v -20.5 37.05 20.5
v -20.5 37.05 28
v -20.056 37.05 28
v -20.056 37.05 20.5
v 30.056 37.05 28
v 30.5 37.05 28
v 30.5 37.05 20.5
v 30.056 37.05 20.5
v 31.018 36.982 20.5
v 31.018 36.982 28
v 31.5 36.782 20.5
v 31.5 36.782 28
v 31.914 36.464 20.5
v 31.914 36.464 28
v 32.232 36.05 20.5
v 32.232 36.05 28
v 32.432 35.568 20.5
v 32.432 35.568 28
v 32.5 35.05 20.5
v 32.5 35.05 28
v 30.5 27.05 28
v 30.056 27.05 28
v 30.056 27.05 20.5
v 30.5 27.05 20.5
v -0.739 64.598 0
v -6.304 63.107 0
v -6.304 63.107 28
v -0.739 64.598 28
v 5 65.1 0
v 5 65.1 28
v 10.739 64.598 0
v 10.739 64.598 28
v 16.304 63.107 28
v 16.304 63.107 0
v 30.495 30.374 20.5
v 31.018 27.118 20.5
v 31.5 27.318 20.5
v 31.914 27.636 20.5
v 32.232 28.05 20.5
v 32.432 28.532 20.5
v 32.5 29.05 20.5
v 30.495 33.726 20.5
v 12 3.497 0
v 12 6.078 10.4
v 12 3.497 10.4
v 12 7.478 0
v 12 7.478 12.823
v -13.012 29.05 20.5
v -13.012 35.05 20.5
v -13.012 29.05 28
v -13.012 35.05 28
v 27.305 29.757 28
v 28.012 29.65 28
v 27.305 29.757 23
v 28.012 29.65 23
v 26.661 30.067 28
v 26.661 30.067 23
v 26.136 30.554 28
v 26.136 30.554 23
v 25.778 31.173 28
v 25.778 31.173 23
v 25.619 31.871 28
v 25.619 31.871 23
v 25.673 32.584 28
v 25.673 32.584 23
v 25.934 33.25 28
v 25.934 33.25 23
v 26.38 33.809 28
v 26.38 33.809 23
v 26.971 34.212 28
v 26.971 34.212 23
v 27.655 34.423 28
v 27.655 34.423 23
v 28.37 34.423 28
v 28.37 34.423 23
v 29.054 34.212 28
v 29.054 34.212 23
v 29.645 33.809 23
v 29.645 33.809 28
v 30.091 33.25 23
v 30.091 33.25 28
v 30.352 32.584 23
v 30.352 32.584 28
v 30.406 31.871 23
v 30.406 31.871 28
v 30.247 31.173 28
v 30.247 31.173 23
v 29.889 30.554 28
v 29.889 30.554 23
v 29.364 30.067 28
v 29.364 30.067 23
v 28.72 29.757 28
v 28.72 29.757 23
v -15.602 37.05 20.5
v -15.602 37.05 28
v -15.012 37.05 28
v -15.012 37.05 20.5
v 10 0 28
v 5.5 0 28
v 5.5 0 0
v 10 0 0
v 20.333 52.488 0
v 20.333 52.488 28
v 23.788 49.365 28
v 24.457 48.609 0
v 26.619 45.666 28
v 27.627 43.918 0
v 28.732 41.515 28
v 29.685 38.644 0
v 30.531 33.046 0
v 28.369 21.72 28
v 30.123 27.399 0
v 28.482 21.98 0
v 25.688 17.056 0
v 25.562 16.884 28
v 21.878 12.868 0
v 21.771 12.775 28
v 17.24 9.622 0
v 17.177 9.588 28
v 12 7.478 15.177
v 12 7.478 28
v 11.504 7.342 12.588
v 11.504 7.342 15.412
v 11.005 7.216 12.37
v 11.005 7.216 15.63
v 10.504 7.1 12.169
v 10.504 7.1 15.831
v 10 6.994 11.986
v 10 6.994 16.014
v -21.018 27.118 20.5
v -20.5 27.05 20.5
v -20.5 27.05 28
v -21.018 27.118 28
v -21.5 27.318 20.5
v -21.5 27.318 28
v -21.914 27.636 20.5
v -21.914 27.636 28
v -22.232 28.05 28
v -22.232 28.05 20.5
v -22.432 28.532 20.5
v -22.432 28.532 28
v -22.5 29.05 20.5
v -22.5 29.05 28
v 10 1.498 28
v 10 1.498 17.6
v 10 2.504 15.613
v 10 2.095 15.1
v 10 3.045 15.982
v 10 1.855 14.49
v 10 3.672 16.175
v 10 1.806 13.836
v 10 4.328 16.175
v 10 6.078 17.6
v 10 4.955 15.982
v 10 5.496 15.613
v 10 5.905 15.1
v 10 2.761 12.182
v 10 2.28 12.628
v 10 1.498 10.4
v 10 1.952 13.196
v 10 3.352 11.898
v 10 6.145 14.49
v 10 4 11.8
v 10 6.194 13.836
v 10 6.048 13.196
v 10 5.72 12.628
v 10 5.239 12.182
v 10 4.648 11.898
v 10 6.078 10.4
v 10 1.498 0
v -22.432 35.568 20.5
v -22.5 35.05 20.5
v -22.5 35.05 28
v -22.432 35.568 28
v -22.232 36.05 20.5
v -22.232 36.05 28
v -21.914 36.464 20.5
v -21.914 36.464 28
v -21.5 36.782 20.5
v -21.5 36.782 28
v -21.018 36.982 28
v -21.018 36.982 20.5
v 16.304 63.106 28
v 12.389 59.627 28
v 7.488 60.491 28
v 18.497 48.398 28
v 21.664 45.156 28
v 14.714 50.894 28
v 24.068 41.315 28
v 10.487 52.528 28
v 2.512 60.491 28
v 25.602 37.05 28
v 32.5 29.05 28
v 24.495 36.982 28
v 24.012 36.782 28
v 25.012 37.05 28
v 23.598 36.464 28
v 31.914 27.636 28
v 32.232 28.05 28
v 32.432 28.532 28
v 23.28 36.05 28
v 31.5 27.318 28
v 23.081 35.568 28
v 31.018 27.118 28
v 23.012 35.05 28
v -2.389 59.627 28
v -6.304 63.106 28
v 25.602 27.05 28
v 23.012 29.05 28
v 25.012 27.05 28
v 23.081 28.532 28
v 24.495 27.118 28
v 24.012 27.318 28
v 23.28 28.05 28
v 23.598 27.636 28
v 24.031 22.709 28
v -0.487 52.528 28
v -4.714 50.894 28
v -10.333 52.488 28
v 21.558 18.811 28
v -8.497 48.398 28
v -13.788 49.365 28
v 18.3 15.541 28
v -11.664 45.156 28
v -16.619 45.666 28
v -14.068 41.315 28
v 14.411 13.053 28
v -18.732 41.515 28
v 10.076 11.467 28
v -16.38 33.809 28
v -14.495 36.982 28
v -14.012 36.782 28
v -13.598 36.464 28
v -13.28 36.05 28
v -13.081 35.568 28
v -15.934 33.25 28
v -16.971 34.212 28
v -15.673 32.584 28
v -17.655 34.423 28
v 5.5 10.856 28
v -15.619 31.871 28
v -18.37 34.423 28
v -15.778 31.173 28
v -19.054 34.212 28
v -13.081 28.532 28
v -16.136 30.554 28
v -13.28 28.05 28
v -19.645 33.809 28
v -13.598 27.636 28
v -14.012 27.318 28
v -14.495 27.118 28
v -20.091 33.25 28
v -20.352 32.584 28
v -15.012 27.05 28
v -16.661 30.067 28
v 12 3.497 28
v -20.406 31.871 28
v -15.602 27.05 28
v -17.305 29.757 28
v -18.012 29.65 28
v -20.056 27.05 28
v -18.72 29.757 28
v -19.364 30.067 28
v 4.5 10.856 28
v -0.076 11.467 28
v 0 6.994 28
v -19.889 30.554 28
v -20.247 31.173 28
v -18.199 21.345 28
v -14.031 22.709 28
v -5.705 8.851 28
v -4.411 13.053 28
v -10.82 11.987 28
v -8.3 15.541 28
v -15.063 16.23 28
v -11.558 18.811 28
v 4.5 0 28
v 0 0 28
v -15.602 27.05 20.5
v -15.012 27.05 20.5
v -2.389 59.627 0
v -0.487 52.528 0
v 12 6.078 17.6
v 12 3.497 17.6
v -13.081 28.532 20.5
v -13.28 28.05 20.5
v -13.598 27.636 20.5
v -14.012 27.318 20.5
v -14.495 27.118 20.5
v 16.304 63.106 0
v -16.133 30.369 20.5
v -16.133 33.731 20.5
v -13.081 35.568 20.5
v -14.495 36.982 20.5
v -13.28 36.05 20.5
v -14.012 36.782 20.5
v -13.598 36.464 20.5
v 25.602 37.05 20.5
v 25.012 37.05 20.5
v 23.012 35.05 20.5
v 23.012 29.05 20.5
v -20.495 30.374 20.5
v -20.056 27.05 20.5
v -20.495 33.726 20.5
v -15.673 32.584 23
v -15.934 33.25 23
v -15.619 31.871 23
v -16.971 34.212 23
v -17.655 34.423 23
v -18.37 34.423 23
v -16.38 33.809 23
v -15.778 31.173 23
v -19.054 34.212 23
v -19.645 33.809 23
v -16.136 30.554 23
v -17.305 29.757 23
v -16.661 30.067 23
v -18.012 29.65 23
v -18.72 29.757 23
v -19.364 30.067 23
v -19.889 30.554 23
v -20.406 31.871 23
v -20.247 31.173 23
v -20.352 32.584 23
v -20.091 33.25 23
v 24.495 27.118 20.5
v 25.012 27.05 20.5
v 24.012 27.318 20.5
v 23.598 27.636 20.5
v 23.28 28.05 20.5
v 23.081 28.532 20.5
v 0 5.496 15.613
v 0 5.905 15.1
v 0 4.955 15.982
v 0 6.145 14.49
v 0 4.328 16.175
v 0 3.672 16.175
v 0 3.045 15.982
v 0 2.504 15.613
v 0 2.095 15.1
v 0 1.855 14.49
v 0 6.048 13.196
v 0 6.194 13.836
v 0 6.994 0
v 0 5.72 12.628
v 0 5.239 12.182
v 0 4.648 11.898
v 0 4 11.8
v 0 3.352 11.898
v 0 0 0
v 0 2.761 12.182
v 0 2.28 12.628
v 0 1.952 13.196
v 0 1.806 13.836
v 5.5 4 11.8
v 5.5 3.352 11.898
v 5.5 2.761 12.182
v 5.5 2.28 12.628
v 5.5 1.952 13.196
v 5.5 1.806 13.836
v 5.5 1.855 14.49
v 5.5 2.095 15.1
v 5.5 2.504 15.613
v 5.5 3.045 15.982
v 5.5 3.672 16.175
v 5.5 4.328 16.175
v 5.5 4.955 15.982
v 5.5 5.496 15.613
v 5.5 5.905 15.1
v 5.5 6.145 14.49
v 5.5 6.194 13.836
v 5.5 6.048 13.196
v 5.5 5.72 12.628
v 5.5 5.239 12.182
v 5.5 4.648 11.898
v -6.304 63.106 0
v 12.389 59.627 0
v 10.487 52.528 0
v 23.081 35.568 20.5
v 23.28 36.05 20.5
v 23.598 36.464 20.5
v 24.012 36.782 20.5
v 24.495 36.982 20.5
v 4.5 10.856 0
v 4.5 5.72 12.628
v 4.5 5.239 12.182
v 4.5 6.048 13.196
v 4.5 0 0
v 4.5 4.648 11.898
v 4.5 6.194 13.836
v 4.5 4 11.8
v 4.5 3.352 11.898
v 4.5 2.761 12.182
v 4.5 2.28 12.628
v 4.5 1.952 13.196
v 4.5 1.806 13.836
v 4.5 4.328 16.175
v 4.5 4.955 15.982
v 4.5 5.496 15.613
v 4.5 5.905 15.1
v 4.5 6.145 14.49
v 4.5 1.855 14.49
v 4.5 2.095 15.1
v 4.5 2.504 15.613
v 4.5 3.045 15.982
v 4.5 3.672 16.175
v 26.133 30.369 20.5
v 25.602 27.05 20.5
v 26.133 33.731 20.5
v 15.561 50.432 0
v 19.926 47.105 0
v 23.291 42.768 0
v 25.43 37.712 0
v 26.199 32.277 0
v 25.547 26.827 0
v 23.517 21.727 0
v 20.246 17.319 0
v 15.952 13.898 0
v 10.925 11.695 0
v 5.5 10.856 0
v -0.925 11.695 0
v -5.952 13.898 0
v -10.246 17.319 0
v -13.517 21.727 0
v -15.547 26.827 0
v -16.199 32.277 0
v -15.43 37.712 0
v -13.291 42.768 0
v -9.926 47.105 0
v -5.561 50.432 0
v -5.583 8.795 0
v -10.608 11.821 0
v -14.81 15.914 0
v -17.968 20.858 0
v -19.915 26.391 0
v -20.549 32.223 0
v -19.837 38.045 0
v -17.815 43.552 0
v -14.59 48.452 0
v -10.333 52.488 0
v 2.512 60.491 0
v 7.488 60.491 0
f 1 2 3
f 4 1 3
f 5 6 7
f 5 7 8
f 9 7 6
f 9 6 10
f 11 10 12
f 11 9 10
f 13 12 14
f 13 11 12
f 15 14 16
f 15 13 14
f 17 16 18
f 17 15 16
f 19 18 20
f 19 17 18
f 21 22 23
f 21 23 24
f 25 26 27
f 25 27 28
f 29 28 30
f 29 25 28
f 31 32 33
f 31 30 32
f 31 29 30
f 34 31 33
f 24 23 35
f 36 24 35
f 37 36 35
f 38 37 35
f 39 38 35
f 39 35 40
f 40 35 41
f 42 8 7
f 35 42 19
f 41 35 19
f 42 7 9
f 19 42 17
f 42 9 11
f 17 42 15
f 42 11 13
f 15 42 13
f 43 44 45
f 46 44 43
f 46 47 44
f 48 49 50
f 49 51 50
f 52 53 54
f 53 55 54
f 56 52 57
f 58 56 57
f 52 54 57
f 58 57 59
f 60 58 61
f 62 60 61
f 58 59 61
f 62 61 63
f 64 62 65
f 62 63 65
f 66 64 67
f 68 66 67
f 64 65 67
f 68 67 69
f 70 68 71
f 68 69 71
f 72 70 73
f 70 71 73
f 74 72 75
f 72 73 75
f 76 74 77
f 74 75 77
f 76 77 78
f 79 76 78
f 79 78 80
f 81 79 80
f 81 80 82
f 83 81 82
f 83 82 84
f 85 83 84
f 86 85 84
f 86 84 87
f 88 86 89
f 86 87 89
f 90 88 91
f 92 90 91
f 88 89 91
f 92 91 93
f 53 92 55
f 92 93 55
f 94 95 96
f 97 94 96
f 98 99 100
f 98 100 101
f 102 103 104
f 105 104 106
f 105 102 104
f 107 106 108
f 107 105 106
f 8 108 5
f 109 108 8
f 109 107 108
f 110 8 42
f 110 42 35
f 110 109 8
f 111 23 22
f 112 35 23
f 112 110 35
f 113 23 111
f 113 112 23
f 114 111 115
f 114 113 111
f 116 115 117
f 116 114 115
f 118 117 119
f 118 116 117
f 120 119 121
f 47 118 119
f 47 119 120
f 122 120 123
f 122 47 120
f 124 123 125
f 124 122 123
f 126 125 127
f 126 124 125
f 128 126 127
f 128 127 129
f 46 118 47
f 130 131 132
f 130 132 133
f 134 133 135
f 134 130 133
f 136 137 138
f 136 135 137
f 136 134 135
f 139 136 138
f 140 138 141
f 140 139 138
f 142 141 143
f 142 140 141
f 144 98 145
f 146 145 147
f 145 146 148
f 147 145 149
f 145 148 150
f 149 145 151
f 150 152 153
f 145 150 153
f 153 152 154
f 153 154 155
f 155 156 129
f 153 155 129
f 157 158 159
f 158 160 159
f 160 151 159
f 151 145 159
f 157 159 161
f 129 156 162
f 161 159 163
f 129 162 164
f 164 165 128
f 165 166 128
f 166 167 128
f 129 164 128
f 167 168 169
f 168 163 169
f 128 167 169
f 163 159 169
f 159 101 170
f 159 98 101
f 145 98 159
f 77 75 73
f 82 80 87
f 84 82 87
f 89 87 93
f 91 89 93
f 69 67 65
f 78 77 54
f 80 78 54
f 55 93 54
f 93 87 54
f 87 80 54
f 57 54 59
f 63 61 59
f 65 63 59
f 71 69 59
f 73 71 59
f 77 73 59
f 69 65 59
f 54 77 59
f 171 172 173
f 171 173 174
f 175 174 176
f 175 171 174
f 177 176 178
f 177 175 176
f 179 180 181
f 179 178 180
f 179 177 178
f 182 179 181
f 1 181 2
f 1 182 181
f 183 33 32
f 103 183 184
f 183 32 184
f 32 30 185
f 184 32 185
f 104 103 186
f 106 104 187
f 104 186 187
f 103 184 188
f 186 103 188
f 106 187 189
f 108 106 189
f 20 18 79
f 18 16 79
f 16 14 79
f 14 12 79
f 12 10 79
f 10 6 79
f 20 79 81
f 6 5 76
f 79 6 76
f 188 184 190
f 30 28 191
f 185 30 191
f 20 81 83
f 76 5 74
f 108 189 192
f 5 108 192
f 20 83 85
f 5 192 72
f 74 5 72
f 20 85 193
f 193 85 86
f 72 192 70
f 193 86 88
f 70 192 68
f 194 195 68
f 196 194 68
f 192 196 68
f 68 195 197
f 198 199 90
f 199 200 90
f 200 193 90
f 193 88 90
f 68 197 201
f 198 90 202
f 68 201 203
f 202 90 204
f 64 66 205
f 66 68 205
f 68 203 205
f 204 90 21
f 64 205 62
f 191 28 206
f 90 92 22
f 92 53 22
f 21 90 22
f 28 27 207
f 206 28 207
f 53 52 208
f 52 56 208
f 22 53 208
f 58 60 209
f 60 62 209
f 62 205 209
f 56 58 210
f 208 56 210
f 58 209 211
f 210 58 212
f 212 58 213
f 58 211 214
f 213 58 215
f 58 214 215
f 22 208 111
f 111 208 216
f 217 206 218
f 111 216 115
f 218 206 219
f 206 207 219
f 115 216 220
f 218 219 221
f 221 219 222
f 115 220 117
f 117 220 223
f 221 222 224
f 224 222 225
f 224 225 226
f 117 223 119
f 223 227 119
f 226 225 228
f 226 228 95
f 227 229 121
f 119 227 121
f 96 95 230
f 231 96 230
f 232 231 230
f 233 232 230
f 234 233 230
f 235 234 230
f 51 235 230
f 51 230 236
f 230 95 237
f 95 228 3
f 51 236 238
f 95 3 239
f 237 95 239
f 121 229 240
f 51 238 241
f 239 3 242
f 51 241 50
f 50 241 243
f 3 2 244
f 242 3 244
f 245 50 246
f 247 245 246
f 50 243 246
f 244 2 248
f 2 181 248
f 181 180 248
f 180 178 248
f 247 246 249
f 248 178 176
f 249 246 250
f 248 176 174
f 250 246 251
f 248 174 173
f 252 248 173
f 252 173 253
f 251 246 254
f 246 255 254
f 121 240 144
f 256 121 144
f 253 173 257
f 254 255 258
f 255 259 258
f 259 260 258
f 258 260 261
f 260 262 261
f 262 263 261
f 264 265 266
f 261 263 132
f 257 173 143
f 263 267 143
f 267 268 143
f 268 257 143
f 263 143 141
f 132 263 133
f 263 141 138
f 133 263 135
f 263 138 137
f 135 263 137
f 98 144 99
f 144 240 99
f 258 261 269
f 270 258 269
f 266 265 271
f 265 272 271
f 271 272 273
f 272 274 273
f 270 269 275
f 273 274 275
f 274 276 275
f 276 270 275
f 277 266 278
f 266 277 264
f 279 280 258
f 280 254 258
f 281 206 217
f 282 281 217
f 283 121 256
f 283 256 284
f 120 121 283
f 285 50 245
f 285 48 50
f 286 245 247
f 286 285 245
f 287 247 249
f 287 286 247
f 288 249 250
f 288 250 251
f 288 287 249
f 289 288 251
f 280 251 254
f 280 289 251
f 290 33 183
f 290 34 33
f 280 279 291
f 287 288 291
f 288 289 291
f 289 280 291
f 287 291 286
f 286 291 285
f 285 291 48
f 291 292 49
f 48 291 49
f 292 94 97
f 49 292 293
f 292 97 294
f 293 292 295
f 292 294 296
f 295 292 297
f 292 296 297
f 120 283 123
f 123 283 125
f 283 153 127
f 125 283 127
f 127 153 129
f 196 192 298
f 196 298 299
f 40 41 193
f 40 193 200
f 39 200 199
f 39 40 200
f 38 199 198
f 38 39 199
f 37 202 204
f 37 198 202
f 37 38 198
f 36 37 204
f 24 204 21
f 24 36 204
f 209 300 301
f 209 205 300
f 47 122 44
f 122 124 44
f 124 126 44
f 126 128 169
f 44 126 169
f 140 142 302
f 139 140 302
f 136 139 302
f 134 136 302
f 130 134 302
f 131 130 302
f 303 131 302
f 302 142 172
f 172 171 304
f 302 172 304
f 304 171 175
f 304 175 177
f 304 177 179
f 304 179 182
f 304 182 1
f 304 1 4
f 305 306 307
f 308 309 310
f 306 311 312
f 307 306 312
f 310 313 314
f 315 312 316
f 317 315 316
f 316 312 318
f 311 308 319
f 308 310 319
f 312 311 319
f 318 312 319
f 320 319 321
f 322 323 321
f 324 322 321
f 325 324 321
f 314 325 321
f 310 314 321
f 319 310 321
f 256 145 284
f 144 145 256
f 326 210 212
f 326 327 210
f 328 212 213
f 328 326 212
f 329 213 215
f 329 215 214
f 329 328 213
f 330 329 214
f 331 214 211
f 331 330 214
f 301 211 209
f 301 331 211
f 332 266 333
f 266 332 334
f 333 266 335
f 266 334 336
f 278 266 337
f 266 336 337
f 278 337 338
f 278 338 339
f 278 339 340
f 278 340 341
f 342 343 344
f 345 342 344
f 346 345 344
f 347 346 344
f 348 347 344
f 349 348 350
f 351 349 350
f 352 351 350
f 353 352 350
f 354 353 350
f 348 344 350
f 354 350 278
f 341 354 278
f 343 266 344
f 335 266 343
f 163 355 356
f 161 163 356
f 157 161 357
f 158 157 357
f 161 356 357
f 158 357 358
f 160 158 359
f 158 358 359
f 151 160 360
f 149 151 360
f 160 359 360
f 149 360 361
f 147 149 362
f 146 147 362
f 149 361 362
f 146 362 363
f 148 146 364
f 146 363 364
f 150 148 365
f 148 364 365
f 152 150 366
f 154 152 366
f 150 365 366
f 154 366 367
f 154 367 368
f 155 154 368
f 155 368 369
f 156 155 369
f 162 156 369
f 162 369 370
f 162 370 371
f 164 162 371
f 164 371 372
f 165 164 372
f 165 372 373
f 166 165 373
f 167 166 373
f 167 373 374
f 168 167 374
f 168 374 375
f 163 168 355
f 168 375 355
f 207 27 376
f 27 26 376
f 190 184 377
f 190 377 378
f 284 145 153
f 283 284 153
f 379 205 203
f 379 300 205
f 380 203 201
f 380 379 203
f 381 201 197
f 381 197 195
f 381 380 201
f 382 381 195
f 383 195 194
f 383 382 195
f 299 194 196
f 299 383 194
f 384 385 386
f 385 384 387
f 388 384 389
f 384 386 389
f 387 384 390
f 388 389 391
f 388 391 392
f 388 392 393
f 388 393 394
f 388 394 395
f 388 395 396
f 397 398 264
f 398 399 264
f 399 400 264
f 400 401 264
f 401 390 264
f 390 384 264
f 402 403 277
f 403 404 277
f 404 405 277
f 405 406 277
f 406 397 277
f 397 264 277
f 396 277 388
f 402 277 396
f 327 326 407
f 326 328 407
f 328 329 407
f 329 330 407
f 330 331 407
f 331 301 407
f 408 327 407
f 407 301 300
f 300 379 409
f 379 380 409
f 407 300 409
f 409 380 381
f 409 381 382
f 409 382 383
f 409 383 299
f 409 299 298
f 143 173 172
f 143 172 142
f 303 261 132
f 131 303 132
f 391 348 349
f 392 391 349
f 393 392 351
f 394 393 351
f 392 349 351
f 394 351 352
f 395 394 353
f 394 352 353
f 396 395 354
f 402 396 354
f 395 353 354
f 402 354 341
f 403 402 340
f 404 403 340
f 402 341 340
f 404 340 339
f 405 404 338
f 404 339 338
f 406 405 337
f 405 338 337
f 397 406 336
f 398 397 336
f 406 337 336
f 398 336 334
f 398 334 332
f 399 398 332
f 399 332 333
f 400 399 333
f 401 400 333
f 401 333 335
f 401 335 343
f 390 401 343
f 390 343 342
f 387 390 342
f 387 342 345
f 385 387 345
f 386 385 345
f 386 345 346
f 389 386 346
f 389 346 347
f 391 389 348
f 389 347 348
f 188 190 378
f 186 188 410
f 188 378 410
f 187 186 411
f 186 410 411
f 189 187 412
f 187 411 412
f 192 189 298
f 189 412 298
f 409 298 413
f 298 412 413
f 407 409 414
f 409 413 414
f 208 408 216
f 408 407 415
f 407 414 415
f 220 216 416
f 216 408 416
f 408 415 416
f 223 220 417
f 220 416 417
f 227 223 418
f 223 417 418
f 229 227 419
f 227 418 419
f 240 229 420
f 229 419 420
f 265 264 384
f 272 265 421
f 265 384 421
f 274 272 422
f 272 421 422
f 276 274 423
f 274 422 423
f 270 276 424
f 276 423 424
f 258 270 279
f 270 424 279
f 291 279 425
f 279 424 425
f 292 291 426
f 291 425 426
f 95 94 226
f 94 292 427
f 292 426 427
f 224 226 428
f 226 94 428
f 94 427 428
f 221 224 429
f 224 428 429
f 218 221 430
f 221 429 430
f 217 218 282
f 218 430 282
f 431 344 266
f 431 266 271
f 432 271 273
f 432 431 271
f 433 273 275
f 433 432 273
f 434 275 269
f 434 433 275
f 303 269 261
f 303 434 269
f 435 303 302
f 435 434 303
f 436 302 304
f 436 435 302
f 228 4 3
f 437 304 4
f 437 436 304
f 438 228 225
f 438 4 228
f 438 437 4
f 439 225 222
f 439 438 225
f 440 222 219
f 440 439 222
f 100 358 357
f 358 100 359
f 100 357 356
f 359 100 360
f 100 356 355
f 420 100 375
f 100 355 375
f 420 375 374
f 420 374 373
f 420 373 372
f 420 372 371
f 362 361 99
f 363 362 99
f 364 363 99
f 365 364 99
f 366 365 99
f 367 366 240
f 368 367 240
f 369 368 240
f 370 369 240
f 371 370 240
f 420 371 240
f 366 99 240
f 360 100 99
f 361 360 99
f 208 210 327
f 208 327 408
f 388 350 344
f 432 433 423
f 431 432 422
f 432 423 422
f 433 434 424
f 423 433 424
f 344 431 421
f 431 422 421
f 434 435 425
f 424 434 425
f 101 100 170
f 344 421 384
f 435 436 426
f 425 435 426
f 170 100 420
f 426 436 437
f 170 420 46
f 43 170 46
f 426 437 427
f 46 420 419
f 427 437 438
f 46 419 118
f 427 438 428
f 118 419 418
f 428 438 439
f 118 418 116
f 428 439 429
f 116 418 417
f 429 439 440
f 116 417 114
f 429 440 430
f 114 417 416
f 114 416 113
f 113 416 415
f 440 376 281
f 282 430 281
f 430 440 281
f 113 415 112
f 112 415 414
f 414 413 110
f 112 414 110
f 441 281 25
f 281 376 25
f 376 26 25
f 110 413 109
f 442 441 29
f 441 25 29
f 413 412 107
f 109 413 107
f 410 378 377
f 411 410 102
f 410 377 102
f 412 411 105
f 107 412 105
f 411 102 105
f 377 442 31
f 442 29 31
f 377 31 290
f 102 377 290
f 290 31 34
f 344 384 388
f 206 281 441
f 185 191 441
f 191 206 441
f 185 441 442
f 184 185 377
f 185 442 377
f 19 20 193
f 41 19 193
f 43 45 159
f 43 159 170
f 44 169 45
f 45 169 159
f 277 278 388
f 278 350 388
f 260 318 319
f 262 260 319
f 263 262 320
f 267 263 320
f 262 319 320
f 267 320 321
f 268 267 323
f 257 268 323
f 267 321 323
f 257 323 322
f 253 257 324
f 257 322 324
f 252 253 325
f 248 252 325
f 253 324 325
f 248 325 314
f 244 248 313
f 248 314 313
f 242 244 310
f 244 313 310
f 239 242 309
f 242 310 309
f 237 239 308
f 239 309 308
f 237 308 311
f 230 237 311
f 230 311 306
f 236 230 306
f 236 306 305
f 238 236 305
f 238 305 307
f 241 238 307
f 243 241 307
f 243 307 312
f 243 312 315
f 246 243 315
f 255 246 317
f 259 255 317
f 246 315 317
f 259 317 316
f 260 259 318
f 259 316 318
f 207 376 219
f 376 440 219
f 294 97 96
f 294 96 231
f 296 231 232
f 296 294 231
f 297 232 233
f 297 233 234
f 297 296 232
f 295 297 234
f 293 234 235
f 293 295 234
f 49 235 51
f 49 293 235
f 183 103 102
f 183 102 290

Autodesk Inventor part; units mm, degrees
ref_plane "YZ Plane" through (0, 0, 0) normal (1, 0, 0) x (0, 1, 0)
ref_plane "XZ Plane" through (0, 0, 0) normal (0, 1, 0) x (-1, 0, 0)
ref_plane "XY Plane" through (0, 0, 0) normal (0, 0, 1) x (1, 0, 0)
sketch "スケッチ1" plane through (0, 0, 0) normal (0, 0, 1) x (1, 0, 0)
  line L0 (0, 0) -> (10, 0)
  line L1 (10, 0) -> (10, 32.05)
  line L2 (10, 32.05) -> (0, 32.05)
  line L3 (0, 32.05) -> (0, 0)
  circle A0 centre (5, 32.05) radius 25.55
  arc A1 (16.3038, 63.1068) -> (-6.3038, 63.1068) centre (5, 32.05) ccw
  line L4 (5, 32.05) -> (16.3038, 63.1068) construction
  line L5 (5, 32.05) -> (-6.3038, 63.1068) construction
  line L6 (-6.3038, 63.1068) -> (-3.7386, 56.0591)
  line L7 (16.3038, 63.1068) -> (13.7386, 56.0591)
  arc A2 (12.3893, 59.6272) -> (-2.3893, 59.6272) centre (5, 32.05) ccw
  arc A3 (10.4481, 52.3827) -> (-0.4481, 52.3827) centre (5, 32.05) ccw
  line L8 (-2.3893, 59.6272) -> (-0.4481, 52.3827)
  line L9 (12.3893, 59.6272) -> (10.4481, 52.3827)
  point P0 (0, 6.994)
  point P1 (10, 6.994)
  point P2 (5, 65.1)
  point P3 (5, 60.6)
  dimension "d0" = 32.05
  dimension "d1" = 51.1
  dimension "d27" = 10
  dimension "d28" = 5
  dimension "d43" = 21.05
  dimension "d44" = 7.5
  dimension "d45" = 4.5
  dimension "d46" = 30
  dimension "d47" = 5
extrude "押し出し1" add sketch "スケッチ1" along normal blind 28 contours L3 A0 L1 L0 | A0 L8 A3 L9 L1 L2 L3 | L3 L2 L1 A0 | L6 A1 L7 A0 L9 A2 L8
sketch "スケッチ2" plane through (0, 0, 28) normal (0, 0, 1) x (1, 0, 0)
  arc A0 (10, 6.994) -> (0, 6.994) centre (5, 32.05) ccw projected
  point P0 (0, 0)
hole "穴1" at (5, 32.05, 28) direction (0, 0, -1) diameter 42.4 end through all
sketch "スケッチ3" plane through (0, 0, 28) normal (0, 0, 1) x (1, 0, 0)
  line L0 (0, 0) -> (10, 0) projected
  line L1 (4.5, 0) -> (5.5, 0)
  line L2 (5.5, 0) -> (5.5, 32.05)
  line L3 (5.5, 32.05) -> (4.5, 32.05)
  line L4 (4.5, 32.05) -> (4.5, 0)
  line L5 (0, 6.994) -> (0, 0) projected
  arc A0 (-0.487, 52.5276) -> (10.487, 52.5276) centre (5, 32.05) ccw projected
  point P0 (5, 0)
  point P1 (5, 0)
  dimension "d14" = 1
extrude "押し出し2" cut sketch "スケッチ3" against normal up to surface (28 mm away)
sketch "スケッチ4" plane through (10, 0, 0) normal (1, 0, 0) x (0, 0, -1)
  circle A0 centre (-14, 4) radius 1.5
  line L0 (0, 0) -> (-28, 0) projected
  line L1 (0, 0) -> (0, 6.994) projected
  line L2 (-14, 0) -> (-14, 10)
  point P0 (0, 10)
  dimension "d17" = 4
  dimension "d19" = 3
hole "穴2" at (10, 4, 14) direction (-1, 0, 0) diameter 4.4 end through all
sketch "スケッチ7" plane through (10, 0, 0) normal (1, 0, 0) x (0, 0, -1)
  circle A0 centre (-14, 4) radius 2.2 projected
  line L0 (-14, 8.1569) -> (-10.4, 6.0785)
  line L1 (-10.4, 6.0785) -> (-10.4, 1.9215)
  line L2 (-10.4, 1.9215) -> (-14, -0.1569)
  line L3 (-14, -0.1569) -> (-17.6, 1.9215)
  line L4 (-17.6, 1.9215) -> (-17.6, 6.0785)
  line L5 (-17.6, 6.0785) -> (-14, 8.1569)
  line L6 (-28, 10.8559) -> (-28, 0) projected
  line L7 (0, 0) -> (0, 6.994) projected
  line L8 (-28, 10.8559) -> (0, 10.8559)
  line L9 (0, 10.8559) -> (0, 3.497)
  line L10 (0, 3.497) -> (-28, 3.497)
  line L11 (-28, 3.497) -> (-28, 10.8559)
  point P0 (-10.4, 3.497)
  point P1 (-28, 3.497)
  point P2 (-17.6, 3.497)
  dimension "d35" = 7.2
extrude "押し出し5" add sketch "スケッチ7" along normal blind 2 contours L10 L6 L8 L9 L7 L1 L0 L5 L4
chamfer "面取り1" distance 2 angle 45 2 edges at (10, 3.497, 22.8) (10, 3.497, 5.2)
chamfer "面取り2" distance 7.5 angle 45 2 edges at (-3.7386, 56.0591, 14) (13.7386, 56.0591, 14)
sketch "スケッチ8" plane through (0, 0, 28) normal (0, 0, 1) x (1, 0, 0)
  arc A0 (12, 7.4776) -> (20.3335, 52.4874) centre (5, 32.05) ccw projected
  line L0 (30.056, 37.05) -> (32.5, 37.05)
  line L1 (32.5, 37.05) -> (32.5, 27.05)
  line L2 (32.5, 27.05) -> (30.056, 27.05)
  line L3 (30.056, 27.05) -> (30.056, 37.05)
  arc A1 (-10.3335, 52.4874) -> (0, 6.994) centre (5, 32.05) ccw projected
  line L4 (-20.056, 37.05) -> (-22.5, 37.05)
  line L5 (-22.5, 37.05) -> (-22.5, 27.05)
  line L6 (-22.5, 27.05) -> (-20.056, 27.05)
  line L7 (-20.056, 27.05) -> (-20.056, 37.05)
  arc A2 (-10.3335, 52.4874) -> (0, 6.994) centre (5, 32.05) ccw projected
  line L8 (30.056, 37.05) -> (23.0125, 37.05)
  line L9 (23.0125, 37.05) -> (23.0125, 27.05)
  line L10 (23.0125, 27.05) -> (30.056, 27.05)
  line L11 (30.056, 27.05) -> (30.056, 37.05)
  line L12 (-20.056, 37.05) -> (-13.0125, 37.05)
  line L13 (-13.0125, 37.05) -> (-13.0125, 27.05)
  line L14 (-13.0125, 27.05) -> (-20.056, 27.05)
  line L15 (-20.056, 27.05) -> (-20.056, 37.05)
  arc A3 (12, 7.4776) -> (20.3335, 52.4874) centre (5, 32.05) ccw projected
  point P0 (0, 0)
  dimension "d51" = 55
  dimension "d52" = 10
  dimension "d57" = 36.025
extrude "押し出し6" add sketch "スケッチ8" against normal blind 7.5
sketch "スケッチ9" plane through (0, 0, 28) normal (0, 0, 1) x (1, 0, 0)
  line L0 (32.5, 27.05) -> (32.5, 37.05) projected
  arc A0 (5.5, 10.8559) -> (10.487, 52.5276) centre (5, 32.05) ccw projected
  point P0 (0, 0)
  point P1 (-18.0125, 32.05)
  point P2 (28.0125, 32.05)
  point P3 (32.5, 32.05)
  dimension "d55" = 46.025
  dimension "d56" = 23.0125
hole "穴3" at (-18.0125, 32.05, 28) at (28.0125, 32.05, 28) direction (0, 0, -1) diameter 4.8 depth 5
fillet "フィレット1" radius 2 8 edges at (-22.5, 37.05, 24.25) (-22.5, 27.05, 24.25) (-13.0125, 37.05, 24.25) (-13.0125, 27.05, 24.25) (32.5, 37.05, 24.25) (32.5, 27.05, 24.25) (23.0125, 37.05, 24.25) (23.0125, 27.05, 24.25)
equation "\"d28\" = 0.5 * d27"
equation "\"d56\" = 0.5 * d55"
properties part number "軸止め" material "ABS プラスチック"
